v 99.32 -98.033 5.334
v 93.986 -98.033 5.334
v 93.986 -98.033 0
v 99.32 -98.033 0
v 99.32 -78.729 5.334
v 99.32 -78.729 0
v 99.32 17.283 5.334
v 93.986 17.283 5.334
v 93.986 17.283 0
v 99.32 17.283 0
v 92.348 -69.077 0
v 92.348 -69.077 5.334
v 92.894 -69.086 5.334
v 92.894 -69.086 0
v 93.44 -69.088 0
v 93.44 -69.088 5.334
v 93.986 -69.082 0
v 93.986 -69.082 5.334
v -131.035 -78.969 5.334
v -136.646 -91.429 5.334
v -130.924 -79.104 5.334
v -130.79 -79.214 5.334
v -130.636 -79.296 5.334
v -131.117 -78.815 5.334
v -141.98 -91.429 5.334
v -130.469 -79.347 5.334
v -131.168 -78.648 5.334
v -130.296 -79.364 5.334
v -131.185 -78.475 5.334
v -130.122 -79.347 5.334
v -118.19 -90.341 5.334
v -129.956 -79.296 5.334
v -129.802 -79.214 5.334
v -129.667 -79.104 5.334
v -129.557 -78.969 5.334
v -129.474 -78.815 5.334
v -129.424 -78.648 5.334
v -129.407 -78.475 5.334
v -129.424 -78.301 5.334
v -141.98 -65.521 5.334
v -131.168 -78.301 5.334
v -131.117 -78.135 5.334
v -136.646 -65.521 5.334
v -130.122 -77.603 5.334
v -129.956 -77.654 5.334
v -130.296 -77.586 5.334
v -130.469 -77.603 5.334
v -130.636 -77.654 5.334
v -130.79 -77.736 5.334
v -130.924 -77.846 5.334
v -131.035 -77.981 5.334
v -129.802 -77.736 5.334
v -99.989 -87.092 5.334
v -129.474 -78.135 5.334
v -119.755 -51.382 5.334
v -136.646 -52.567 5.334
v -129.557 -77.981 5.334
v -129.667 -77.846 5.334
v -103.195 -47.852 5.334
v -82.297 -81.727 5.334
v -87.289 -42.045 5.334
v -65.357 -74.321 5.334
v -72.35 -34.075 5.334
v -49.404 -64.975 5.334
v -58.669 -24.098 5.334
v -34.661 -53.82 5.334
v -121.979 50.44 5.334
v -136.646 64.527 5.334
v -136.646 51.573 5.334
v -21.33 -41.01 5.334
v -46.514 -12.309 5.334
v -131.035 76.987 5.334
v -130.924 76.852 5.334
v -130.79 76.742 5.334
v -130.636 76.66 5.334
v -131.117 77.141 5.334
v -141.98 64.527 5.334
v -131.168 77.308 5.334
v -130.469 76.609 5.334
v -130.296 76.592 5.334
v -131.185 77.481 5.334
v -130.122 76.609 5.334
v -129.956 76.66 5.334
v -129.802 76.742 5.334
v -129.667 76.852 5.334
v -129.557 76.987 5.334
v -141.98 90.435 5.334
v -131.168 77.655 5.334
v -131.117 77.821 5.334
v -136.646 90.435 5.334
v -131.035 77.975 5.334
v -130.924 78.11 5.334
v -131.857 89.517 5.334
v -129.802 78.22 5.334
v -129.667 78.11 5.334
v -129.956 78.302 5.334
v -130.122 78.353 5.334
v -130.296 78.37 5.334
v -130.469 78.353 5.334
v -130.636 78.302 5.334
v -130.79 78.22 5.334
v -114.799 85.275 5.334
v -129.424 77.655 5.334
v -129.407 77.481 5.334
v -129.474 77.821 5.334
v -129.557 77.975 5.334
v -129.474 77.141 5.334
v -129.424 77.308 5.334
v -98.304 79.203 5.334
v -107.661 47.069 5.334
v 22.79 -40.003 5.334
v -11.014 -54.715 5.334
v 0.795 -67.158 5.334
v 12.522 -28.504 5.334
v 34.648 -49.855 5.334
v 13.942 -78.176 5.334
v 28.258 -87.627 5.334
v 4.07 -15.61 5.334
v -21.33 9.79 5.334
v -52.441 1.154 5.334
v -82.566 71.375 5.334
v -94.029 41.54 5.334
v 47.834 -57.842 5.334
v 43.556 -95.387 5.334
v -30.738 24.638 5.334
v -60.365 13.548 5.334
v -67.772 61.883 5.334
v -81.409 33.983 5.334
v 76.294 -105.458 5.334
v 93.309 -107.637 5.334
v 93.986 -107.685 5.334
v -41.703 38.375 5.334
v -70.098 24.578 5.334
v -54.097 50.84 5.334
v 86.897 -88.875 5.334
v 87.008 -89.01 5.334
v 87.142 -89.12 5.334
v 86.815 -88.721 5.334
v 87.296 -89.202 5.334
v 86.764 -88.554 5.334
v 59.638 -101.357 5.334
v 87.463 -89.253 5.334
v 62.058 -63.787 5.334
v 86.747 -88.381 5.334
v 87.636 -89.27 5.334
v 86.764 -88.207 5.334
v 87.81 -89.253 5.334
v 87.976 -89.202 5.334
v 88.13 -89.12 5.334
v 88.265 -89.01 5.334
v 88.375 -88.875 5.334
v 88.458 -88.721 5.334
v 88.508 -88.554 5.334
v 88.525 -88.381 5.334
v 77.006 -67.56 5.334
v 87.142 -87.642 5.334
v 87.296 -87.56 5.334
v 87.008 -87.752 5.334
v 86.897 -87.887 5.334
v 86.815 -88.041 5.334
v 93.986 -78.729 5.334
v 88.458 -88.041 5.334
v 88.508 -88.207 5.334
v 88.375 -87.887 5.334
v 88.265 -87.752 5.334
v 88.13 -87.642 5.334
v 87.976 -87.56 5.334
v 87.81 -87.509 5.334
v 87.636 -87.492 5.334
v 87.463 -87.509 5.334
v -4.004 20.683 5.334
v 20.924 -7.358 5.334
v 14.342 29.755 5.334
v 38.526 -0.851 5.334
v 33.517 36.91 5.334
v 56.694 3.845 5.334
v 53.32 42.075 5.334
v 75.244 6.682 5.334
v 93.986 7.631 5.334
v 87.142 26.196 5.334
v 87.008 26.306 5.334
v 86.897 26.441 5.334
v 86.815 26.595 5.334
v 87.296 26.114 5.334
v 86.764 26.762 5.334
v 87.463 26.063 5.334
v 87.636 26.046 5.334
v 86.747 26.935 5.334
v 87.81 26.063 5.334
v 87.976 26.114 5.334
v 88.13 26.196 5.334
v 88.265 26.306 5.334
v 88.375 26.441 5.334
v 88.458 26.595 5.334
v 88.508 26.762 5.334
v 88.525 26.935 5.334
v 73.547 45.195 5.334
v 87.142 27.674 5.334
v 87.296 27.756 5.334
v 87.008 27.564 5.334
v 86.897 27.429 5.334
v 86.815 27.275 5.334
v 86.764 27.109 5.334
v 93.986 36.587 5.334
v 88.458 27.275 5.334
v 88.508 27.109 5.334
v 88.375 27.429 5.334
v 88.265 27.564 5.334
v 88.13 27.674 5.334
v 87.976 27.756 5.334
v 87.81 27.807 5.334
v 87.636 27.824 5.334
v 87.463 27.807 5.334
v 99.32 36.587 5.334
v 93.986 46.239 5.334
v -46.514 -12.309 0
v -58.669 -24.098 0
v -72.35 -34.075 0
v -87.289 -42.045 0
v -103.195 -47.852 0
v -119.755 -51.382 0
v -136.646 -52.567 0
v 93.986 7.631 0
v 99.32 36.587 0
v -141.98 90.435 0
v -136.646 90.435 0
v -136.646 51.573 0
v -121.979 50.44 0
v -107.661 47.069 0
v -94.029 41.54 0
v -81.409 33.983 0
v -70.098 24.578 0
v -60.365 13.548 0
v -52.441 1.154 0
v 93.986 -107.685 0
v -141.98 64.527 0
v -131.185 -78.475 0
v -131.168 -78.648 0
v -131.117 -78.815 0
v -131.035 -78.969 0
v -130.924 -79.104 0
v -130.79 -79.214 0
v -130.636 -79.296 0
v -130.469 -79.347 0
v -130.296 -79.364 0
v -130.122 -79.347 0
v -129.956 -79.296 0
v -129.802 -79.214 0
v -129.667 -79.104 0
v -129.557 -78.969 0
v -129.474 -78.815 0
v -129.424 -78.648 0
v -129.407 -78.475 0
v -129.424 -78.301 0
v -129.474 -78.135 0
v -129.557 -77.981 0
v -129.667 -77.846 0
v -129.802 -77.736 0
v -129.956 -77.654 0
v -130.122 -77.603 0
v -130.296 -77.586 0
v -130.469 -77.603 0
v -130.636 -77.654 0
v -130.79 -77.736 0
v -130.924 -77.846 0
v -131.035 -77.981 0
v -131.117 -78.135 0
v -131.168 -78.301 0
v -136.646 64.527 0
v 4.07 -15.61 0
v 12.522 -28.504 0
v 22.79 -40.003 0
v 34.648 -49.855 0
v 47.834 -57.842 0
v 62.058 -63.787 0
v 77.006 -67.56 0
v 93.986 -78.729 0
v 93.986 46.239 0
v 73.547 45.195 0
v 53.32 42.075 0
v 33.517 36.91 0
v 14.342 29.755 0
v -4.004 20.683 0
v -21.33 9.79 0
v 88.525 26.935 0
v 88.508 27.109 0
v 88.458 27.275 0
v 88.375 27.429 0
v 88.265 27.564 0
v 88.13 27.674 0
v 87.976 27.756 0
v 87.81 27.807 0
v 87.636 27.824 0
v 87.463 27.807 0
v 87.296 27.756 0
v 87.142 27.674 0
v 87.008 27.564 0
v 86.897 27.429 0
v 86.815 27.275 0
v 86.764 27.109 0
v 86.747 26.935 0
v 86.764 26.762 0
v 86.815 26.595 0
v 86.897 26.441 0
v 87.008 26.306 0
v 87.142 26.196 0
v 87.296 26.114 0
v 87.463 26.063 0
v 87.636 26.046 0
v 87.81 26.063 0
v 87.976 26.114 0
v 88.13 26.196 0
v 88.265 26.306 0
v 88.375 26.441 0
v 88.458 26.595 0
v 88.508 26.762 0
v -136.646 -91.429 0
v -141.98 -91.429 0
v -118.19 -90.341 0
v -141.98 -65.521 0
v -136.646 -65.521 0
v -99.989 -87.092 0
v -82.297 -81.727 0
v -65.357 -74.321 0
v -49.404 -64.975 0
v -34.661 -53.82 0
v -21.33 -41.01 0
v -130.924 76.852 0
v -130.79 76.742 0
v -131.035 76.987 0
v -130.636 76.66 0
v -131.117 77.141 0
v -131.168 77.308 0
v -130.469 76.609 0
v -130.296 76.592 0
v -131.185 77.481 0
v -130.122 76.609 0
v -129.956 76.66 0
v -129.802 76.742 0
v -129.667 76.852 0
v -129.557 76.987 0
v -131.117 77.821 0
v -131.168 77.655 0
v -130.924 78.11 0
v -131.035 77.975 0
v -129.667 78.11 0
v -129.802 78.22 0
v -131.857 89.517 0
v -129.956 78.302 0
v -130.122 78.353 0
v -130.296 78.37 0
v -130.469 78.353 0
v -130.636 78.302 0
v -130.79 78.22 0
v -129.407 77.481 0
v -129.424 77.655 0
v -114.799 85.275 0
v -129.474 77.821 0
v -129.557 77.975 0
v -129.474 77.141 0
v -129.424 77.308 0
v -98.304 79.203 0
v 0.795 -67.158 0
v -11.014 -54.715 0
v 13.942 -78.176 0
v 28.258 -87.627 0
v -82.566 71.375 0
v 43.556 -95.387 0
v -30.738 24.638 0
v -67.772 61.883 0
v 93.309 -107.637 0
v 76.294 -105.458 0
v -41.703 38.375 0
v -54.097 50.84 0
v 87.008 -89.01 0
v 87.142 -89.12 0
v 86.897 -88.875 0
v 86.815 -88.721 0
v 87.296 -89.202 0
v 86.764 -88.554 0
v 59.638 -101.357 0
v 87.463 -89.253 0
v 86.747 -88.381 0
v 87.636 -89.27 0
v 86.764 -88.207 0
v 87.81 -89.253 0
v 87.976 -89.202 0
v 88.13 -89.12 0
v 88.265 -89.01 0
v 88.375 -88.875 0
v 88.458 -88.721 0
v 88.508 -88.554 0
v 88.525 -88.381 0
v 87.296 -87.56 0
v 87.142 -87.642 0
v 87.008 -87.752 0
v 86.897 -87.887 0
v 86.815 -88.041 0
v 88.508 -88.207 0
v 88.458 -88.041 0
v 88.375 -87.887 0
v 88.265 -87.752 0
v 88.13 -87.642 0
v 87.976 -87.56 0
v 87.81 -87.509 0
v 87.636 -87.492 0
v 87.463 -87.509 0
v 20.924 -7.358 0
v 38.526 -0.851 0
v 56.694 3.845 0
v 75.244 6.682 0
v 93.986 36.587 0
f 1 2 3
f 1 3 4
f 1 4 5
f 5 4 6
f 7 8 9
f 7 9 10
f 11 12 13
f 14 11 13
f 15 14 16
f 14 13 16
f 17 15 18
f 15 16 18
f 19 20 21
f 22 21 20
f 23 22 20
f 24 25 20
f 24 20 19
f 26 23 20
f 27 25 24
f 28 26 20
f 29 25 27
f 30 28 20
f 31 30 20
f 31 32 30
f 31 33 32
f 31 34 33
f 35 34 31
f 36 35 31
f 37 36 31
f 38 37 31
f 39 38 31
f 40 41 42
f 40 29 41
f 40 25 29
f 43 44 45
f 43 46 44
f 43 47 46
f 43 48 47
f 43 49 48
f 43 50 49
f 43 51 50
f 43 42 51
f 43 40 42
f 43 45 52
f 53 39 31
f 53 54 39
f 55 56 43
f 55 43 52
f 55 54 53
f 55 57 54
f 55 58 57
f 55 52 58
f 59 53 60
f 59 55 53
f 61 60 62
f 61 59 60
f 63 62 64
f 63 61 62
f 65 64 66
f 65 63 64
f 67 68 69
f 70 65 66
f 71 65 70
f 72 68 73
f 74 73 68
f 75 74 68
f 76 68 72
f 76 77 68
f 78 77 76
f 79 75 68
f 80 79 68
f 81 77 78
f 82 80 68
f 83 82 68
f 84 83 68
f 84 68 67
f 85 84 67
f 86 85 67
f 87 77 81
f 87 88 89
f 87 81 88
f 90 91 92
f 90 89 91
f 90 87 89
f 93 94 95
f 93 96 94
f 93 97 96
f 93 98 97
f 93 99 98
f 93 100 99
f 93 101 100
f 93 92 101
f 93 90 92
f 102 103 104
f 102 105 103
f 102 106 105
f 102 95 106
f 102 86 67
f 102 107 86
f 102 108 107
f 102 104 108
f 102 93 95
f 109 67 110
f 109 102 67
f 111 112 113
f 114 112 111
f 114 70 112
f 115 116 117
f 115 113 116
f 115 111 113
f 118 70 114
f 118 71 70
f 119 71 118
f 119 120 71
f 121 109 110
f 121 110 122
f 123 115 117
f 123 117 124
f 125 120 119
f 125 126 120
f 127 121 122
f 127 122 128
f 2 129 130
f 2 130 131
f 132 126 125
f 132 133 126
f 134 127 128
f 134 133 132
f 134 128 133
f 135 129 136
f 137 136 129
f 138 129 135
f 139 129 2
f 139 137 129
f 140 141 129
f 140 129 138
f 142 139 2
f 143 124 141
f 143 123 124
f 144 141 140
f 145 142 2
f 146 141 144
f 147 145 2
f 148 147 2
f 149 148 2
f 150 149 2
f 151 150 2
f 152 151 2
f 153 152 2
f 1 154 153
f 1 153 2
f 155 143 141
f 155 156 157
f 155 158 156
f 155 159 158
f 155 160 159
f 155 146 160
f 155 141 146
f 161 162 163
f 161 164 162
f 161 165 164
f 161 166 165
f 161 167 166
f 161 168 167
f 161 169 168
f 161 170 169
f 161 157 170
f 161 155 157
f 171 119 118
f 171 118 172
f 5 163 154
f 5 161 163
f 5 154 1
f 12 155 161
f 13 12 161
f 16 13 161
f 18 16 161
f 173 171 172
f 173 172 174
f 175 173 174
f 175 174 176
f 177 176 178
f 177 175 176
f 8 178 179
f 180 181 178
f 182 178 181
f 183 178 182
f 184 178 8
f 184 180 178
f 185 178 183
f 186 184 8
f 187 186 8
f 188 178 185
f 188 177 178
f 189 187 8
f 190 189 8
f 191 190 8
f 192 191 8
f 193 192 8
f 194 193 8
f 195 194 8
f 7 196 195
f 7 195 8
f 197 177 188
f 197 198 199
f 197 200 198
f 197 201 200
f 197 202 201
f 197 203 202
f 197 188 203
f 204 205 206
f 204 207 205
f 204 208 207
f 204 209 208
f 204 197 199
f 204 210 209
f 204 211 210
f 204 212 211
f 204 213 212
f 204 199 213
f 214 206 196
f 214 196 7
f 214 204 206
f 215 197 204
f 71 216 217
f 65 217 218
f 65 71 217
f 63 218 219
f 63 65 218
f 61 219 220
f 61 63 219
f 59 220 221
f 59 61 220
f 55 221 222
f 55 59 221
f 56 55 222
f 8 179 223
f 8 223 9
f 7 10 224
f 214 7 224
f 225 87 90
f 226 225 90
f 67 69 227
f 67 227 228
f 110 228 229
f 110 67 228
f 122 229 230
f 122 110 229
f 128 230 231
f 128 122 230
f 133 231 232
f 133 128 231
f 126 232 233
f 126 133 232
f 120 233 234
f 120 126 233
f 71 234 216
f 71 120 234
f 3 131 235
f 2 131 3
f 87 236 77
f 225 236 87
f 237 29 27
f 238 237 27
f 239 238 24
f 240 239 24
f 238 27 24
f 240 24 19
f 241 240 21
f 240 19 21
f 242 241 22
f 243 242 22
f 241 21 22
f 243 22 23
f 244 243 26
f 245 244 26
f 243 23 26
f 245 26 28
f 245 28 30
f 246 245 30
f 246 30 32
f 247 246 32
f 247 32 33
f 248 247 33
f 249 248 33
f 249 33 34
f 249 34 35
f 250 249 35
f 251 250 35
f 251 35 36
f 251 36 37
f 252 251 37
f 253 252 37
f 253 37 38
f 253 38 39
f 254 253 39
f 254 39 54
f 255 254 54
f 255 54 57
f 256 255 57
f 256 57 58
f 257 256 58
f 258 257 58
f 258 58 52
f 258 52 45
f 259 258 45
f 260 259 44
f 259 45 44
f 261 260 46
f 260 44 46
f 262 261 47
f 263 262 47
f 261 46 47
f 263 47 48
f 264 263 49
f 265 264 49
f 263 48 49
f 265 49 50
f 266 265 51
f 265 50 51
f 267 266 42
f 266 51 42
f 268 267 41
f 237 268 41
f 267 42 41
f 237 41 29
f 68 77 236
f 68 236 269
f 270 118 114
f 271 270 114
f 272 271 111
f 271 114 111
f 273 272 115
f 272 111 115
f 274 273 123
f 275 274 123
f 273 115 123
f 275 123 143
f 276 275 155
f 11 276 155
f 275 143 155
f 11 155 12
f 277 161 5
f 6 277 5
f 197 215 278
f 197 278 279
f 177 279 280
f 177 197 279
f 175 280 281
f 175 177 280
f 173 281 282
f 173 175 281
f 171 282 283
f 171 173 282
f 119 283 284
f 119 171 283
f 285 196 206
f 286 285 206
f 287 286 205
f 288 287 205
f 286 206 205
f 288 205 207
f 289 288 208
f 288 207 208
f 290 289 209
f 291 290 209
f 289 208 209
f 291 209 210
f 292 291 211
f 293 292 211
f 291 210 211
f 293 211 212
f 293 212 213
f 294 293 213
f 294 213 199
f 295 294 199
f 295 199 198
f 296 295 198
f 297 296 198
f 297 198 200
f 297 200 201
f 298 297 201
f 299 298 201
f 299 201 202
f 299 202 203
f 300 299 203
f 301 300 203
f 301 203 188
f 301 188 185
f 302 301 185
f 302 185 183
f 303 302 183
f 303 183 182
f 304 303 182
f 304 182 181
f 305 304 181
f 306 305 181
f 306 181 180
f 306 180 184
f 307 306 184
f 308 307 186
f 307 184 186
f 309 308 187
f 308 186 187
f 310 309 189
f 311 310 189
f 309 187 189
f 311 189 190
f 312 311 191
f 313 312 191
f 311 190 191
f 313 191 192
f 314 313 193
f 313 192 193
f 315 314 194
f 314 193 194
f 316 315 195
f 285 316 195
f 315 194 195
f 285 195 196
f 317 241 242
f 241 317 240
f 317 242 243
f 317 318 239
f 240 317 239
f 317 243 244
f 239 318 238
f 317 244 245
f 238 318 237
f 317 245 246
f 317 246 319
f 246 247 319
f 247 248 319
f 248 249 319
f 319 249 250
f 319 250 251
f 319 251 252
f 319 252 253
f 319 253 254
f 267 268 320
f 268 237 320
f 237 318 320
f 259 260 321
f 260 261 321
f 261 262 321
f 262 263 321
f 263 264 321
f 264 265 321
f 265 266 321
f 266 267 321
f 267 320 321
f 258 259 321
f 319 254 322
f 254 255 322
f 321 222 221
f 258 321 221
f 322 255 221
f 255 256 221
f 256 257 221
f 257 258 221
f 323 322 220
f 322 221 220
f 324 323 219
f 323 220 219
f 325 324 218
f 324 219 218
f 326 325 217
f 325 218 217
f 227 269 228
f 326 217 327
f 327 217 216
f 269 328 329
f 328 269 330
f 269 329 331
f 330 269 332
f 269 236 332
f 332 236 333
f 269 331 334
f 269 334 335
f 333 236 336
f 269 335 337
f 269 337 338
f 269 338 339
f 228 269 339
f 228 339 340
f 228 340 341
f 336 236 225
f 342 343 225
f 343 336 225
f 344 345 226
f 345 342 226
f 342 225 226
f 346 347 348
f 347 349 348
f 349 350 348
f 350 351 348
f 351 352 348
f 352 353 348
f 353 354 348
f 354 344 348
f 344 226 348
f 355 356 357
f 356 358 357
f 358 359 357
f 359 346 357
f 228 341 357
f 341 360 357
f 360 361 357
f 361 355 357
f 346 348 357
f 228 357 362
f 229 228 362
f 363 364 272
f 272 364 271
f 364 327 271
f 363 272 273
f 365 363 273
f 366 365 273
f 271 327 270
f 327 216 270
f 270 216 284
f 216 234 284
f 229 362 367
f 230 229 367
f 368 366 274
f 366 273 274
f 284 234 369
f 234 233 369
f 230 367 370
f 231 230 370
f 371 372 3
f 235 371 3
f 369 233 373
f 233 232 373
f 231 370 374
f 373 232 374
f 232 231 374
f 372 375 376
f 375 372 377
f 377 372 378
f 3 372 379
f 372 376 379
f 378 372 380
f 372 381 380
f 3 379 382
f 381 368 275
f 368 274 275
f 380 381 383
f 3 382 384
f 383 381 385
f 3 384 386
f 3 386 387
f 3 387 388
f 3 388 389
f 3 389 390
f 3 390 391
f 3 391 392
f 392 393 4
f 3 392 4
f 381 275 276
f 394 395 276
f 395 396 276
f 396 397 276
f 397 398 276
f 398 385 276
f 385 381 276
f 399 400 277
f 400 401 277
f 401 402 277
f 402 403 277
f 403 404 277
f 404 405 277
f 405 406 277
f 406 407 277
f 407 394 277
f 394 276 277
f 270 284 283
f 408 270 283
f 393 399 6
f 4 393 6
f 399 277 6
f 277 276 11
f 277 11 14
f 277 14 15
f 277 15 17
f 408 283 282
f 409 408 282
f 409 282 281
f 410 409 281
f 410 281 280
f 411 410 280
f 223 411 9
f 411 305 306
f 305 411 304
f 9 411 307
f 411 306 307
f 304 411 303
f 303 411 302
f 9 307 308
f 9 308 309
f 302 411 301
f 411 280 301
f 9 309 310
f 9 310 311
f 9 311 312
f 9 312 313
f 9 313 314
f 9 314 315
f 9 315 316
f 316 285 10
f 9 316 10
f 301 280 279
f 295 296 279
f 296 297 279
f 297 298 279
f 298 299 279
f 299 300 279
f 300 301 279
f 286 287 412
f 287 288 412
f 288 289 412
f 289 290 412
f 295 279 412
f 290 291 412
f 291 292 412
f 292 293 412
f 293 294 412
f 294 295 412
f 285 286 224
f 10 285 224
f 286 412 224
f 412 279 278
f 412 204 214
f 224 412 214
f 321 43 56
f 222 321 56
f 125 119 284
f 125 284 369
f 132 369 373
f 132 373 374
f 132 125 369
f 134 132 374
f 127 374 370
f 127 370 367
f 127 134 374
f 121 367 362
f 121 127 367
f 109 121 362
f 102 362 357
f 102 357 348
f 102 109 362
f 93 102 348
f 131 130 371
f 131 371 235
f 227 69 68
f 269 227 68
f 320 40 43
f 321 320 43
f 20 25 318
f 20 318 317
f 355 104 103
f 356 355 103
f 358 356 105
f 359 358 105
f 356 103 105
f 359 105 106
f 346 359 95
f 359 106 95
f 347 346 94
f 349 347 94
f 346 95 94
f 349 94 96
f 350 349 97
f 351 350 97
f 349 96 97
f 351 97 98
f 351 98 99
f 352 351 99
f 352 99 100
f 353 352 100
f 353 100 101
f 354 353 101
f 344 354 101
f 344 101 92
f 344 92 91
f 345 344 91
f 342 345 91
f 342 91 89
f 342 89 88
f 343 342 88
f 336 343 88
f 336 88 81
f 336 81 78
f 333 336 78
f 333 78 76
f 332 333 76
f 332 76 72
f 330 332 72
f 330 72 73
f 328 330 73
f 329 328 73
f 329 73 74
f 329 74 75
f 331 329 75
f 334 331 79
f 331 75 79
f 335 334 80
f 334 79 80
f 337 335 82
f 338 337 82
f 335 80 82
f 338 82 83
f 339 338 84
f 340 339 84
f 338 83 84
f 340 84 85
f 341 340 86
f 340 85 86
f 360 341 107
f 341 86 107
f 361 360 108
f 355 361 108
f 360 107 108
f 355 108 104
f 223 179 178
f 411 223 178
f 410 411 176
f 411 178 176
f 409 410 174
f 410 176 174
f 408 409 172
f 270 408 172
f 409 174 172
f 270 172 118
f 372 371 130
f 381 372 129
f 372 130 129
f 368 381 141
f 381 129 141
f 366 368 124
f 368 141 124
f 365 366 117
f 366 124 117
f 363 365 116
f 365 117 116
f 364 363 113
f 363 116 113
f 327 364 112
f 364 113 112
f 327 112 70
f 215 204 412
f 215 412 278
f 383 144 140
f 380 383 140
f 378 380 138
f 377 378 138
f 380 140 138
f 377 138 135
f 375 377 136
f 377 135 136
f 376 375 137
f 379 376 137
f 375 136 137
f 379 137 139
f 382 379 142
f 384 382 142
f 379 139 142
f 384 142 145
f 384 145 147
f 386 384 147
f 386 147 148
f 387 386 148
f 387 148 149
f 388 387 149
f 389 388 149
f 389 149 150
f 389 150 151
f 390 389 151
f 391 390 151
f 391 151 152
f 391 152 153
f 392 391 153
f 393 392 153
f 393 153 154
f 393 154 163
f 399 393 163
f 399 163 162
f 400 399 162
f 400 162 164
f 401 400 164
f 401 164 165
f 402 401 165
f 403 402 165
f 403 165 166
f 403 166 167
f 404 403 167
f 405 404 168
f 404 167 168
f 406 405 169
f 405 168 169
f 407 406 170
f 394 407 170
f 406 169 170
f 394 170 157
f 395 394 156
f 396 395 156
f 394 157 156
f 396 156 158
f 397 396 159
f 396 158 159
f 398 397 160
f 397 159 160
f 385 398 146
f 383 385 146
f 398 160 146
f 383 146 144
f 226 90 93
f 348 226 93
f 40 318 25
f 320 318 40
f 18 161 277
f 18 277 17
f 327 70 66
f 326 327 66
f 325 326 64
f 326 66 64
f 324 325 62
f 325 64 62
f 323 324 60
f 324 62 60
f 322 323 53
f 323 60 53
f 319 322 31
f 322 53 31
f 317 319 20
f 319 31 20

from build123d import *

# Parameters (mm, degrees)
SKETCH1_W           = 241.3
SKETCH1_H           = 198.12
BOSS_EXTRUDE1_DEPTH = 5.334
SKETCH2_W           = 5.334
SKETCH2_H           = 9.652
SKETCH2_H_2         = 96.012
SKETCH2_H_3         = 53.848
CUT_EXTRUDE1_DEPTH  = 179.277190048
SKETCH3_W           = 5.334
SKETCH3_H           = 16.256
SKETCH3_H_2         = 130.048
CUT_EXTRUDE2_DEPTH  = 179.277190048
CUT_EXTRUDE5_DEPTH  = 179.277190048
CUT_EXTRUDE6_DEPTH  = 179.277190048
CUT_EXTRUDE7_DEPTH  = 179.277190048
SKETCH8_R           = 0.889
CUT_EXTRUDE8_DEPTH  = 179.277190048
SKETCH9_R           = 0.889
CUT_EXTRUDE9_DEPTH  = 179.277190048


with BuildPart() as part:
    # Sketch1 → Boss-Extrude1 (new body)
    with BuildSketch(Plane.XY):
        with Locations((-21.329797884, -8.624919689)):
            Rectangle(SKETCH1_W, SKETCH1_H)
    extrude(amount=BOSS_EXTRUDE1_DEPTH)

    # Sketch2 → Cut-Extrude1 (cut, through all)
    with BuildSketch(Plane.XY.offset(5.334)):
        with Locations((96.653202116, -102.858919689)):
            Rectangle(SKETCH2_W, SKETCH2_H)
        with Locations((96.653202116, -30.722919689)):
            Rectangle(SKETCH2_W, SKETCH2_H_2)
        with Locations((96.653202116, 63.511080311)):
            Rectangle(SKETCH2_W, SKETCH2_H_3)
    extrude(amount=-CUT_EXTRUDE1_DEPTH, mode=Mode.SUBTRACT)

    # Sketch3 → Cut-Extrude2 (cut, through all)
    with BuildSketch(Plane.XY.offset(5.334)):
        with Locations((-139.312797884, -99.556919689)):
            Rectangle(SKETCH3_W, SKETCH3_H)
        with Locations((-139.312797884, -0.496919689)):
            Rectangle(SKETCH3_W, SKETCH3_H_2)
    extrude(amount=-CUT_EXTRUDE2_DEPTH, mode=Mode.SUBTRACT)

    # Sketch5 → Cut-Extrude5 (cut, through all)
    with BuildSketch(Plane.XY.offset(5.334)):
        Polygon((-136.645797884, -91.428919689), (93.986202116, -107.684919689), (93.986202116, -162.860416997), (-136.645797884, -146.604416997), align=None)
    extrude(amount=-CUT_EXTRUDE5_DEPTH, mode=Mode.SUBTRACT)

    # Sketch6 → Cut-Extrude6 (cut, through all)
    with BuildSketch(Plane.XY.offset(5.334)):
        Polygon((-136.645797884, 90.435080311), (93.986202116, 46.239080311), (93.986202116, 90.435080311), (-136.645797884, 134.631080311), align=None)
    extrude(amount=-CUT_EXTRUDE6_DEPTH, mode=Mode.SUBTRACT)

    # Sketch7 → Cut-Extrude7 (cut, through all)
    with BuildSketch(Plane.XY.offset(5.334)):
        with BuildLine():
            Line((-131.85688859, 89.517381834), (93.986202116, 46.239080311))
            ThreePointArc((93.986202116, 46.239080311), (33.516562096, 36.909943164), (-21.329797884, 9.790080311))
            ThreePointArc((-21.329797884, 9.790080311), (-67.77177066, 61.883202454), (-131.85688859, 89.517381834))
        make_face()
        with BuildLine():
            Line((-136.645797884, -91.428919689), (93.309245371, -107.637204677))
            ThreePointArc((93.309245371, -107.637204677), (28.257929174, -87.626903784), (-21.329797884, -41.009919689))
            ThreePointArc((-21.329797884, -41.009919689), (-73.717554191, -78.2732768), (-136.645797884, -91.428919689))
        make_face()
        with BuildLine():
            ThreePointArc((93.986202116, 7.631080311), (47.550679246, 1.726898301), (4.070202116, -15.609919689))
            ThreePointArc((4.070202116, -15.609919689), (41.092439587, -54.093369858), (92.347831876, -69.076919689))
            ThreePointArc((92.347831876, -69.076919689), (131.631647498, -31.544467715), (93.986202116, 7.631080311))
        make_face()
        with BuildLine():
            ThreePointArc((-136.645797884, 51.573080311), (-81.408536453, 33.982932584), (-46.514432981, -12.3092902))
            ThreePointArc((-46.514432981, -12.3092902), (-87.289086913, -42.04513502), (-136.645797884, -52.566919689))
            ThreePointArc((-136.645797884, -52.566919689), (-188.715797884, -0.496919689), (-136.645797884, 51.573080311))
        make_face()
    extrude(amount=-CUT_EXTRUDE7_DEPTH, mode=Mode.SUBTRACT)

    # Sketch8 → Cut-Extrude8 (cut, through all)
    with BuildSketch(Plane.XY.offset(5.334)):
        with Locations((-130.295797884, 77.481080311)):
            Circle(SKETCH8_R)
        with Locations(Location((-130.295797884, -78.474919689, 0), (0, 0, 180))):
            Circle(SKETCH8_R)
    extrude(amount=-CUT_EXTRUDE8_DEPTH, mode=Mode.SUBTRACT)

    # Sketch9 → Cut-Extrude9 (cut, through all)
    with BuildSketch(Plane.XY.offset(5.334)):
        with Locations((87.636202116, 26.935080311)):
            Circle(SKETCH9_R)
        with Locations(Location((87.636202116, -88.380919689, 0), (0, 0, 180))):
            Circle(SKETCH9_R)
    extrude(amount=-CUT_EXTRUDE9_DEPTH, mode=Mode.SUBTRACT)


solid = part.part
